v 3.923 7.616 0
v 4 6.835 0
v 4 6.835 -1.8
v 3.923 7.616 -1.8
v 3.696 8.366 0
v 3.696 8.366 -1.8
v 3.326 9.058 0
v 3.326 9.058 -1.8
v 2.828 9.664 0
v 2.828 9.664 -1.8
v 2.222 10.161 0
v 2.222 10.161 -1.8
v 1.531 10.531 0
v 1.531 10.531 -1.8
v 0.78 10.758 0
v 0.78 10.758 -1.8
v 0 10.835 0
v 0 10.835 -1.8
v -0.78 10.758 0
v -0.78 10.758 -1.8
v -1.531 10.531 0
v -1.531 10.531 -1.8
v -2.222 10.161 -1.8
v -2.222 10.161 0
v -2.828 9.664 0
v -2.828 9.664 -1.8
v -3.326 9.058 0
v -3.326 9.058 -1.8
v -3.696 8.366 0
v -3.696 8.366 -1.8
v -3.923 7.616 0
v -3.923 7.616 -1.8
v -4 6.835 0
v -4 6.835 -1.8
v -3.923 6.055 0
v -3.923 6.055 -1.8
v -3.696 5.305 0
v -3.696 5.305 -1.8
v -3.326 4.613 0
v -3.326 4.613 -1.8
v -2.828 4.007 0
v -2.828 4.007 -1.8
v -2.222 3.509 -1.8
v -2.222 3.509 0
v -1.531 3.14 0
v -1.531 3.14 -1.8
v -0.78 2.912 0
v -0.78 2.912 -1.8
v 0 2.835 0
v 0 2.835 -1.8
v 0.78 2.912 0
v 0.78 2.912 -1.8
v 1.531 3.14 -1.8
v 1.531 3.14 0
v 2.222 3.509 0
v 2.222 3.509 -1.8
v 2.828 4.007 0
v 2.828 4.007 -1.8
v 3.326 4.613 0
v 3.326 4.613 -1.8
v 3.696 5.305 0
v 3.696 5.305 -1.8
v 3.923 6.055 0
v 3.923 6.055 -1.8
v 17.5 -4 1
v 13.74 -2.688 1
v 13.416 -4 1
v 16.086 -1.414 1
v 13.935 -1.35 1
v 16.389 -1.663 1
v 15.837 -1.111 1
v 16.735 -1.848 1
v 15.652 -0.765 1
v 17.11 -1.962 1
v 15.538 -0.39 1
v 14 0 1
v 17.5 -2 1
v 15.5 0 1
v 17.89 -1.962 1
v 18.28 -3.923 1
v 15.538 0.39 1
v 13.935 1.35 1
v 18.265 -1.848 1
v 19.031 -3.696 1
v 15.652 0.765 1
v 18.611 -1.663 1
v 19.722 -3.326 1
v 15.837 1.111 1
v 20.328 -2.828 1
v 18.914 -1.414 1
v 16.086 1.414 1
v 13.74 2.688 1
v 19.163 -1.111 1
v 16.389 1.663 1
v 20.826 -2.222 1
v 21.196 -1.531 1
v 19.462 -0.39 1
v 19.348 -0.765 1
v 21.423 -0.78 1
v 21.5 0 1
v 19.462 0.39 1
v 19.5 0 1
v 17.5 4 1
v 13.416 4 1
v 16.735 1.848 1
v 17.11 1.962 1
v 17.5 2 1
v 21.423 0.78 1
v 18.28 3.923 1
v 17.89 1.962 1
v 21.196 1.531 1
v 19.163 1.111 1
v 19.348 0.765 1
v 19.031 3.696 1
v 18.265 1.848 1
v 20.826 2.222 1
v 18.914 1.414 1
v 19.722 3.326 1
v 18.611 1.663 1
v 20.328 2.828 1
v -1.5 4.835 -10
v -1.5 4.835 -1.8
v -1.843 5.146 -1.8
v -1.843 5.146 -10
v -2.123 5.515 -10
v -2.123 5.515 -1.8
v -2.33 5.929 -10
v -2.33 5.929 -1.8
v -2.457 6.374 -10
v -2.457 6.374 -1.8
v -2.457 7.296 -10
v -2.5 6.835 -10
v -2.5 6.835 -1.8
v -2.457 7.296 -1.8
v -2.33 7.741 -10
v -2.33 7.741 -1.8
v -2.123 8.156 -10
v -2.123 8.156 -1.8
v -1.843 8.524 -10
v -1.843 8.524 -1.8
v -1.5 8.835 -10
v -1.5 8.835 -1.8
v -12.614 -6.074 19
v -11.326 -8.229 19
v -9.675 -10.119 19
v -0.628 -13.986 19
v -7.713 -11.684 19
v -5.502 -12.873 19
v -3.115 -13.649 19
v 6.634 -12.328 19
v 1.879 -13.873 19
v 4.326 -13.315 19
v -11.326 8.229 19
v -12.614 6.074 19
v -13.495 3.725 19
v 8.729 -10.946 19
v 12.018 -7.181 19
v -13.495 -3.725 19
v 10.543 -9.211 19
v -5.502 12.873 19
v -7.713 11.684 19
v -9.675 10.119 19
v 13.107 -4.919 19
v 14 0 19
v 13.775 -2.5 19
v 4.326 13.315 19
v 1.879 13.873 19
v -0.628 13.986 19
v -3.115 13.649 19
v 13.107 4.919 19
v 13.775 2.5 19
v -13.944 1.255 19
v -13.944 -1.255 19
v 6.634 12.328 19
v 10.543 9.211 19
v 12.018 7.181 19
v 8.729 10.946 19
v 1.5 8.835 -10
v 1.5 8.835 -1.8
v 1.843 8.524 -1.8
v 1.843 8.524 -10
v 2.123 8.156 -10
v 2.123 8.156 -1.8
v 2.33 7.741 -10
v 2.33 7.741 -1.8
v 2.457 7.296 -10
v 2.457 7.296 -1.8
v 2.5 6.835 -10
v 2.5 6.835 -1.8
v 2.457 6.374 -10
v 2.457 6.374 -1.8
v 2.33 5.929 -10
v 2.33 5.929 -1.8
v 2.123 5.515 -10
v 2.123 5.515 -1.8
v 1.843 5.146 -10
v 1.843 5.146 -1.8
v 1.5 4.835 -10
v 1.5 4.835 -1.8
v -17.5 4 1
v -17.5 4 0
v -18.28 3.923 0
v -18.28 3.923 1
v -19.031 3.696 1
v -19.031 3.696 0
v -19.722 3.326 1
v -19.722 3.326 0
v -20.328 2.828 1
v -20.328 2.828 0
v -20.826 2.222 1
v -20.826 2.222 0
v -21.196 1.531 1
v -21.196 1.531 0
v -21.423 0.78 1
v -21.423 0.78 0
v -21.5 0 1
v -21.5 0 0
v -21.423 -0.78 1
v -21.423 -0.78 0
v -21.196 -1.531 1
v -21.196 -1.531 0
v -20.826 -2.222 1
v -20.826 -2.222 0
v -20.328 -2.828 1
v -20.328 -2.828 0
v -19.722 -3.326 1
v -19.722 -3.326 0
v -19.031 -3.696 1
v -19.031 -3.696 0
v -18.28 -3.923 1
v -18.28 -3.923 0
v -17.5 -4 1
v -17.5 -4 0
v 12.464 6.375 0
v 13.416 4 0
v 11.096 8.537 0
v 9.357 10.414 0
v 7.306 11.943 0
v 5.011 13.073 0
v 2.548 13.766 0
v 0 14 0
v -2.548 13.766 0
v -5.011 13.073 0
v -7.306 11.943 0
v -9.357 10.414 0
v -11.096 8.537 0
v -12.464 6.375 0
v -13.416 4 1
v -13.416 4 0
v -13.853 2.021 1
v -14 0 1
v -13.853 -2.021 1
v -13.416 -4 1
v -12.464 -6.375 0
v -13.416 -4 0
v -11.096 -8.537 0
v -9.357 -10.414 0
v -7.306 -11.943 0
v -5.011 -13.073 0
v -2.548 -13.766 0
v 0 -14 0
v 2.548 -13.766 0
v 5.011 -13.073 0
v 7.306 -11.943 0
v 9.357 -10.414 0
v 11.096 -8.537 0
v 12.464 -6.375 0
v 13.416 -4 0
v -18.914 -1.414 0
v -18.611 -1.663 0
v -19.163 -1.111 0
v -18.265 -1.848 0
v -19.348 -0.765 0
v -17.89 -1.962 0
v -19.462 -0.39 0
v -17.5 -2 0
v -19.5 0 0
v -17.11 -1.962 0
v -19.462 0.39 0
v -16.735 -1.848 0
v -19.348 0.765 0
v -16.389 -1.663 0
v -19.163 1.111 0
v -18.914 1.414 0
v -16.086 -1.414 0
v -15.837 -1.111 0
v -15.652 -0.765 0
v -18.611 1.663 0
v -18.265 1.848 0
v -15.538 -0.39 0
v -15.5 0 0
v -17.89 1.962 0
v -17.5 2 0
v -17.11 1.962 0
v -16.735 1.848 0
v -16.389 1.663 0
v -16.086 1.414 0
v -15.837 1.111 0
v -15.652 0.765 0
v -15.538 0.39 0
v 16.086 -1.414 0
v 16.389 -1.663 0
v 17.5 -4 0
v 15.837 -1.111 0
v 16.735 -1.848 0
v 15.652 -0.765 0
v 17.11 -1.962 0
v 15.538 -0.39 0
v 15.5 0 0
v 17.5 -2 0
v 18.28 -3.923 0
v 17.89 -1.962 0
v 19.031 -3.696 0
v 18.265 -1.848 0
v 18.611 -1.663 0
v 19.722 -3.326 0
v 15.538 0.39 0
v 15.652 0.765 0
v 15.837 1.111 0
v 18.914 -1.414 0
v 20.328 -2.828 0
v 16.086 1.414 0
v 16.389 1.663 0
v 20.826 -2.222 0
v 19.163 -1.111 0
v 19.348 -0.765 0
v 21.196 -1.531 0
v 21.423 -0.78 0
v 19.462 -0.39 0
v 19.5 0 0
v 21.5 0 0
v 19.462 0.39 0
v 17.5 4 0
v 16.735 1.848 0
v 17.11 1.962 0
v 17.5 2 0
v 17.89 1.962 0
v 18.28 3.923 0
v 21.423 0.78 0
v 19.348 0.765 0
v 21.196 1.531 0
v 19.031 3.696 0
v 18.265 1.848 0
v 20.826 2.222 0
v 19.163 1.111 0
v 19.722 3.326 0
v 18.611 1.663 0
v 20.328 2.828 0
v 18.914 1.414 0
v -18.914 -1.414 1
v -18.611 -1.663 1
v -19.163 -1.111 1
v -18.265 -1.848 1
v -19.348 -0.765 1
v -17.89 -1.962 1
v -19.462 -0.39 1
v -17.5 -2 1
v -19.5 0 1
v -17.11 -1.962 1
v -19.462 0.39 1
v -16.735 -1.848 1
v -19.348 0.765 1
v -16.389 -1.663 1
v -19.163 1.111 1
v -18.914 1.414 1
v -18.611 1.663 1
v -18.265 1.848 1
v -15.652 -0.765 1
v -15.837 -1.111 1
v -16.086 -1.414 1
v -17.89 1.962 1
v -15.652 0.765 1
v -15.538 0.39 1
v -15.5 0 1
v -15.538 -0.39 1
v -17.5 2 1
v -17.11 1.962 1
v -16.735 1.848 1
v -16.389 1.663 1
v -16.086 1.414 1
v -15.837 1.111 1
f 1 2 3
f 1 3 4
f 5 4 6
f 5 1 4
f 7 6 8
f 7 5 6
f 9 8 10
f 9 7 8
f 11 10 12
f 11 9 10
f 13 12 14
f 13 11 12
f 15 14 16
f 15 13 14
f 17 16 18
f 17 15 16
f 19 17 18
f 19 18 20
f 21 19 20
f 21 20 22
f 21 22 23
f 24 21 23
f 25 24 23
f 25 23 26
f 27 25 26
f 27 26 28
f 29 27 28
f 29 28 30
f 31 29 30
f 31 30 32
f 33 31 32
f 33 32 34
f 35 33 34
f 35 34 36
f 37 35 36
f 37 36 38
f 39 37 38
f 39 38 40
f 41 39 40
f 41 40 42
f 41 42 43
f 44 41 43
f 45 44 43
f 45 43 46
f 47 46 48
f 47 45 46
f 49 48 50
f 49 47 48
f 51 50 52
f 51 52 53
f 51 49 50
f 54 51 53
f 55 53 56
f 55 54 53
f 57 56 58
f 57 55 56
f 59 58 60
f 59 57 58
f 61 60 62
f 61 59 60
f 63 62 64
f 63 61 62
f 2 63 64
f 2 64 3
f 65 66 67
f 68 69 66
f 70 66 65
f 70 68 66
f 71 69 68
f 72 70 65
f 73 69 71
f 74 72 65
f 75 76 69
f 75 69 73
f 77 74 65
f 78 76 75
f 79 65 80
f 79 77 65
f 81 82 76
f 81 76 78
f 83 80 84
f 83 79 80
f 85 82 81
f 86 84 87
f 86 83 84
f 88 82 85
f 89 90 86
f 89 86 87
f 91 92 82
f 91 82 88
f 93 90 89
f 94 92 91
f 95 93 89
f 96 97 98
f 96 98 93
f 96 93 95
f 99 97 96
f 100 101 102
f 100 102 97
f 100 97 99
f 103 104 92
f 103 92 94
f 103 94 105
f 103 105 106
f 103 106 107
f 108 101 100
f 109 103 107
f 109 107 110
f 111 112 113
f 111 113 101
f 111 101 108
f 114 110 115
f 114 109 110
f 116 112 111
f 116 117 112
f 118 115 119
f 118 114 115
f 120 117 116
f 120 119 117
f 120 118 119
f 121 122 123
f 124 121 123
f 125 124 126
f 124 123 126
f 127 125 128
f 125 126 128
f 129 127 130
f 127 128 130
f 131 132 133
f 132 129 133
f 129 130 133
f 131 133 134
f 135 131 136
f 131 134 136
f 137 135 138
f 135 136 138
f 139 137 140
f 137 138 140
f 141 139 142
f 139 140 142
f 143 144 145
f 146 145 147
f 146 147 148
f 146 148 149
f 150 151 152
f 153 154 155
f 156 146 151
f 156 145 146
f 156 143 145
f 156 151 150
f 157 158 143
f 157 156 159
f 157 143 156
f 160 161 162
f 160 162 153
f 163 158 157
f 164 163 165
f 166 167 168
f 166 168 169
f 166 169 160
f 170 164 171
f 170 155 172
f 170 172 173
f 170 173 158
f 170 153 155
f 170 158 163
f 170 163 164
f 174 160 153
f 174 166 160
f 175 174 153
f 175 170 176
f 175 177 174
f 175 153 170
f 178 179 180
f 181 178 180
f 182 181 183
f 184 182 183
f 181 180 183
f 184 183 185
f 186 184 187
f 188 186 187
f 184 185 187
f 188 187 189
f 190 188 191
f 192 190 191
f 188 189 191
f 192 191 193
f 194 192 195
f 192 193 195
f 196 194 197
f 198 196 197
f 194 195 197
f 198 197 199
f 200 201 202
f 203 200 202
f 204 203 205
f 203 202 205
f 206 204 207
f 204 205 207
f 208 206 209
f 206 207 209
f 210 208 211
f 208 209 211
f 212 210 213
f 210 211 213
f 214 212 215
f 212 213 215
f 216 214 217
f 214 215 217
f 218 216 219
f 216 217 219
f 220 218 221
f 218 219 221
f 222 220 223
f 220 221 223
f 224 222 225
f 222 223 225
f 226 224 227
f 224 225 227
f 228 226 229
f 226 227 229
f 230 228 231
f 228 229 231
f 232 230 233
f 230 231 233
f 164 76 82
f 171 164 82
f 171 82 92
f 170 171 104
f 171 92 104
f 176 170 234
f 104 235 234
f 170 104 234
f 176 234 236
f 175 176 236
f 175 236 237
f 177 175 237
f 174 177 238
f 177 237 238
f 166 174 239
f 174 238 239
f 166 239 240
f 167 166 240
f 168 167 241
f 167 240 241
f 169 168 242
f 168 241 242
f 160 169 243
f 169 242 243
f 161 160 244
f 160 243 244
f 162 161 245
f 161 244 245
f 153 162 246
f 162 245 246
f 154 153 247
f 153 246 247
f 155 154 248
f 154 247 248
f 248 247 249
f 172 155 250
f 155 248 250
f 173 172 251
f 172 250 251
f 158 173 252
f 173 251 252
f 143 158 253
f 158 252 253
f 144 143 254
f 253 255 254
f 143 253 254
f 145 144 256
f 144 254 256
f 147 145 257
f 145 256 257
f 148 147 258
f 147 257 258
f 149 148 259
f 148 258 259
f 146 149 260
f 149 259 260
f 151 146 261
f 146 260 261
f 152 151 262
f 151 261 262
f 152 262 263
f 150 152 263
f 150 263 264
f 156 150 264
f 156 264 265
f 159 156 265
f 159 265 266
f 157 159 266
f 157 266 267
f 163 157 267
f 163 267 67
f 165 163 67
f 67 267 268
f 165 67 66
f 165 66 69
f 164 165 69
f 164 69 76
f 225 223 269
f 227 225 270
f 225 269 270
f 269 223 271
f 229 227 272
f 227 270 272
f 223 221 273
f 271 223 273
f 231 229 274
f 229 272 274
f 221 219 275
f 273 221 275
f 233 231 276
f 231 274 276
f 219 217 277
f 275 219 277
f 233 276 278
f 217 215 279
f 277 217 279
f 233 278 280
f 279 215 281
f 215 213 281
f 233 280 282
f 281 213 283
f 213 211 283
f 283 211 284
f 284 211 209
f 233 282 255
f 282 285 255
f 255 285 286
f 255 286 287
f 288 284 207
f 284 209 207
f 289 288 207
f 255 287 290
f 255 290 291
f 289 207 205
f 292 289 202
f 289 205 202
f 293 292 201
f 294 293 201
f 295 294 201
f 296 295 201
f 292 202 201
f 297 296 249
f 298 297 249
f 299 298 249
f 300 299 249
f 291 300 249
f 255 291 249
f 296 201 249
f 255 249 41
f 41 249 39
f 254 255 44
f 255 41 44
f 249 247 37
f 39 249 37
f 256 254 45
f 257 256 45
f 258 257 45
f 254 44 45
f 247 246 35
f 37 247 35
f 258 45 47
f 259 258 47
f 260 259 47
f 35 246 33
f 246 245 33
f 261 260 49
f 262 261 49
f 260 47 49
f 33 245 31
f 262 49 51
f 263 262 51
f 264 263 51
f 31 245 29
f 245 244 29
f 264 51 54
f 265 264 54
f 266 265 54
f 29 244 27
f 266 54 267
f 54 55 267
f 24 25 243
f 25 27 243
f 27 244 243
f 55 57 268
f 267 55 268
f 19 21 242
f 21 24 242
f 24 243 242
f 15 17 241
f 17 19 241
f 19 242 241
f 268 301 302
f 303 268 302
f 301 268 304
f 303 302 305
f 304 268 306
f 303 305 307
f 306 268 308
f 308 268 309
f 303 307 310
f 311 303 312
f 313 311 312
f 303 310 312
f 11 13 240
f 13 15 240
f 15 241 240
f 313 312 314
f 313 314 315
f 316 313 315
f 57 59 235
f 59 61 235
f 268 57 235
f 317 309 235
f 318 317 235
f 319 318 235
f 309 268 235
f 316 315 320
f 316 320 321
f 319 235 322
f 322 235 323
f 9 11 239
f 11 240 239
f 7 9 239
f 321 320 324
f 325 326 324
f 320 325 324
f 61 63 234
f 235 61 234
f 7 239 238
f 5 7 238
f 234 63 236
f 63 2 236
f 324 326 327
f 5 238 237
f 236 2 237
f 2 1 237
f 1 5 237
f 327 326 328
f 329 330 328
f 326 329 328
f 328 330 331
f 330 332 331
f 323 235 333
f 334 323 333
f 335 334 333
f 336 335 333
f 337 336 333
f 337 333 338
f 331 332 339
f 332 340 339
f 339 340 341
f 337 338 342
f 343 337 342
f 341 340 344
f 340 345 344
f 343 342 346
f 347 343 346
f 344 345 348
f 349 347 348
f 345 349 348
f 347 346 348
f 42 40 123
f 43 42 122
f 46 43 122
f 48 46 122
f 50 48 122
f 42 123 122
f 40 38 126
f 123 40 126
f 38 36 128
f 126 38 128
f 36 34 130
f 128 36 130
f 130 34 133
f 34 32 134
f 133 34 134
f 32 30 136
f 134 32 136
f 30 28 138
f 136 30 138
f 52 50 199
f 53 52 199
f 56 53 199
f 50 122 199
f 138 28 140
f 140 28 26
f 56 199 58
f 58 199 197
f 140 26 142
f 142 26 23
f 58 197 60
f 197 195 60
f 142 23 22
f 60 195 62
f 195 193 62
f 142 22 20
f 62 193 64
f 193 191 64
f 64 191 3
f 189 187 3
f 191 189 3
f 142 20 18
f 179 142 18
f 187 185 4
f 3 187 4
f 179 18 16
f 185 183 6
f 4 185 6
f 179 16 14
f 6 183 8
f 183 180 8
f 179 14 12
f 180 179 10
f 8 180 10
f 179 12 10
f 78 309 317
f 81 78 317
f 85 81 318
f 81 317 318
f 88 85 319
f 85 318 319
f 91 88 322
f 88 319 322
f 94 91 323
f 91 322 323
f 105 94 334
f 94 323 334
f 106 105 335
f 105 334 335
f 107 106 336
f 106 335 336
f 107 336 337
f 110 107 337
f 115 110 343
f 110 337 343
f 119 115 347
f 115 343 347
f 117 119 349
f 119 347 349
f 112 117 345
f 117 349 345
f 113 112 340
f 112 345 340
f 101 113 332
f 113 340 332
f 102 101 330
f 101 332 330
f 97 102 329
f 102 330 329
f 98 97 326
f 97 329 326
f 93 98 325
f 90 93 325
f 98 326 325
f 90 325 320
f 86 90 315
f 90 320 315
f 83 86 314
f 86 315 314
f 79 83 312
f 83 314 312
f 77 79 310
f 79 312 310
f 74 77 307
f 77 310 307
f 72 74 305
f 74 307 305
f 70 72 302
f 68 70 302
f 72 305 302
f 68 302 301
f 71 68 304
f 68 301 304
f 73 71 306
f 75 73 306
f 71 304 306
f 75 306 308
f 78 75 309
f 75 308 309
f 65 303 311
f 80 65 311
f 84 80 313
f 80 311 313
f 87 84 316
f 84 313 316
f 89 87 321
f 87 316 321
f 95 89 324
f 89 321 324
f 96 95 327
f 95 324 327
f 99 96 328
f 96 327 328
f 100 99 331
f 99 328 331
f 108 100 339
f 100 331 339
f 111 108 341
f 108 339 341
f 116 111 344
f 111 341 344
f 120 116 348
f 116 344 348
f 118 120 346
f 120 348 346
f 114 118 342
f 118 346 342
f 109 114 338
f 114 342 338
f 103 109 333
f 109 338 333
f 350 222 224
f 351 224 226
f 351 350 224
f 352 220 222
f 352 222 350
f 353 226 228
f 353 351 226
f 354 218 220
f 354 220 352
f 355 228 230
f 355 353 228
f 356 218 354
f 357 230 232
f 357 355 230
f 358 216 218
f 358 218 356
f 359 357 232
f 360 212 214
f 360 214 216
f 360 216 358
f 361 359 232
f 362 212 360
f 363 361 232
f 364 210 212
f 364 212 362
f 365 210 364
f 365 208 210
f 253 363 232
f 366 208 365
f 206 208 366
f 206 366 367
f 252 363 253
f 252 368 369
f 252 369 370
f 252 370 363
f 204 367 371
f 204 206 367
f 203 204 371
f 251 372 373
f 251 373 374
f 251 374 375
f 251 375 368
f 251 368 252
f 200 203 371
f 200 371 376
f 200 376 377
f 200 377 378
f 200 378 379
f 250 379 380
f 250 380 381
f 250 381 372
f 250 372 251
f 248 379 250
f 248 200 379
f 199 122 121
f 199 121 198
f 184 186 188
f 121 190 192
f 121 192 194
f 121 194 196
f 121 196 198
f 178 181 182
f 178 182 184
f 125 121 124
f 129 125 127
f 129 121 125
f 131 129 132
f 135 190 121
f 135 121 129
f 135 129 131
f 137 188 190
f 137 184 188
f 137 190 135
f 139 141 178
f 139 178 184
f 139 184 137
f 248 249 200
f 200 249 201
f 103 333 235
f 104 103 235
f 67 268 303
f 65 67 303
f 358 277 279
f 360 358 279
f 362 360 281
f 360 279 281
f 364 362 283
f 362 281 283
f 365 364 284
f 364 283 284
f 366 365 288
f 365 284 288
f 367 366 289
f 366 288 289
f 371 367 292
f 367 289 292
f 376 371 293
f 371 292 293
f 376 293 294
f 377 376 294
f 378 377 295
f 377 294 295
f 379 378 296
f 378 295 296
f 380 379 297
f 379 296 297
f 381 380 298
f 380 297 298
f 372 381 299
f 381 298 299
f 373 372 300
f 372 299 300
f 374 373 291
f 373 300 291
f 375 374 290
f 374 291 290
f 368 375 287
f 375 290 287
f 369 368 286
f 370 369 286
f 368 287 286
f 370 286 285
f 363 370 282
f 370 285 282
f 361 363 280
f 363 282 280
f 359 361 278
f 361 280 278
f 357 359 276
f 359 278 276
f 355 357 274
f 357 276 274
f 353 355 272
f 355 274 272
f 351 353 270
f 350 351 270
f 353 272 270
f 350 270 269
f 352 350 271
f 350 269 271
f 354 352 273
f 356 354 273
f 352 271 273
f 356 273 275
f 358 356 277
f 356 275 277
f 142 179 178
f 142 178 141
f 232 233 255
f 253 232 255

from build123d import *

# Parameters (mm, degrees)
SKETCH_1_R          = 14
EXTRUDE_1_DEPTH     = 19
SKETCH_3_R          = 4
EXTRUDE_2_DEPTH     = 1.8
SKETCH_4_R          = 2.5
EXTRUDE_3_DEPTH     = 8.2
SKETCH_5_R          = 2
EXTRUDE_4_DEPTH     = 1
CUT_EXTRUDE_START   = -8.2
CUT_EXTRUDE_1_DEPTH = 8.2


with BuildPart() as part:
    # 草图1 → 凸台-拉伸1 (new body)
    with BuildSketch(Plane.XY):
        Circle(SKETCH_1_R)
    extrude(amount=EXTRUDE_1_DEPTH)

    # 草图3 → 凸台-拉伸2 (add)
    with BuildSketch(Plane.XY):
        with Locations((0, 6.835245796)):
            Circle(SKETCH_3_R)
    extrude(amount=-EXTRUDE_2_DEPTH)

    # 草图4 → 凸台-拉伸3 (add)
    with BuildSketch(Plane(origin=(0, 0, -1.8), x_dir=(-1, 0, 0), z_dir=(0, 0, -1))):
        with Locations((0, 6.835245796)):
            Circle(SKETCH_4_R)
    extrude(amount=EXTRUDE_3_DEPTH)

    # 草图5 → 凸台-拉伸4 (add)
    with BuildSketch(Plane(origin=(0, 0, 0), x_dir=(-1, 0, 0), z_dir=(0, 0, -1))):
        with BuildLine():
            Line((-17.5, 4), (17.5, 4))
            ThreePointArc((17.5, 4), (21.5, 0), (17.5, -4))
            Line((17.5, -4), (-17.5, -4))
            ThreePointArc((-17.5, -4), (-21.5, 0), (-17.5, 4))
        make_face()
        with Locations((17.5, 0)):
            Circle(SKETCH_5_R, mode=Mode.SUBTRACT)
        with Locations((-17.5, 0)):
            Circle(SKETCH_5_R, mode=Mode.SUBTRACT)
    extrude(amount=-EXTRUDE_4_DEPTH)

    # 草图6 → 切除-拉伸1 (cut)
    with BuildSketch(Plane(origin=(0, 0, -10), x_dir=(-1, 0, 0), z_dir=(0, 0, -1)).offset(CUT_EXTRUDE_START)):
        with BuildLine():
            Line((-1.5, 8.835245796), (1.5, 8.835245796))
            ThreePointArc((1.5, 8.835245796), (0, 9.335245796), (-1.5, 8.835245796))
        make_face()
        with BuildLine():
            Line((1.5, 4.835245796), (-1.5, 4.835245796))
            ThreePointArc((-1.5, 4.835245796), (0, 4.335245796), (1.5, 4.835245796))
        make_face()
    extrude(amount=CUT_EXTRUDE_1_DEPTH, mode=Mode.SUBTRACT)


solid = part.part
